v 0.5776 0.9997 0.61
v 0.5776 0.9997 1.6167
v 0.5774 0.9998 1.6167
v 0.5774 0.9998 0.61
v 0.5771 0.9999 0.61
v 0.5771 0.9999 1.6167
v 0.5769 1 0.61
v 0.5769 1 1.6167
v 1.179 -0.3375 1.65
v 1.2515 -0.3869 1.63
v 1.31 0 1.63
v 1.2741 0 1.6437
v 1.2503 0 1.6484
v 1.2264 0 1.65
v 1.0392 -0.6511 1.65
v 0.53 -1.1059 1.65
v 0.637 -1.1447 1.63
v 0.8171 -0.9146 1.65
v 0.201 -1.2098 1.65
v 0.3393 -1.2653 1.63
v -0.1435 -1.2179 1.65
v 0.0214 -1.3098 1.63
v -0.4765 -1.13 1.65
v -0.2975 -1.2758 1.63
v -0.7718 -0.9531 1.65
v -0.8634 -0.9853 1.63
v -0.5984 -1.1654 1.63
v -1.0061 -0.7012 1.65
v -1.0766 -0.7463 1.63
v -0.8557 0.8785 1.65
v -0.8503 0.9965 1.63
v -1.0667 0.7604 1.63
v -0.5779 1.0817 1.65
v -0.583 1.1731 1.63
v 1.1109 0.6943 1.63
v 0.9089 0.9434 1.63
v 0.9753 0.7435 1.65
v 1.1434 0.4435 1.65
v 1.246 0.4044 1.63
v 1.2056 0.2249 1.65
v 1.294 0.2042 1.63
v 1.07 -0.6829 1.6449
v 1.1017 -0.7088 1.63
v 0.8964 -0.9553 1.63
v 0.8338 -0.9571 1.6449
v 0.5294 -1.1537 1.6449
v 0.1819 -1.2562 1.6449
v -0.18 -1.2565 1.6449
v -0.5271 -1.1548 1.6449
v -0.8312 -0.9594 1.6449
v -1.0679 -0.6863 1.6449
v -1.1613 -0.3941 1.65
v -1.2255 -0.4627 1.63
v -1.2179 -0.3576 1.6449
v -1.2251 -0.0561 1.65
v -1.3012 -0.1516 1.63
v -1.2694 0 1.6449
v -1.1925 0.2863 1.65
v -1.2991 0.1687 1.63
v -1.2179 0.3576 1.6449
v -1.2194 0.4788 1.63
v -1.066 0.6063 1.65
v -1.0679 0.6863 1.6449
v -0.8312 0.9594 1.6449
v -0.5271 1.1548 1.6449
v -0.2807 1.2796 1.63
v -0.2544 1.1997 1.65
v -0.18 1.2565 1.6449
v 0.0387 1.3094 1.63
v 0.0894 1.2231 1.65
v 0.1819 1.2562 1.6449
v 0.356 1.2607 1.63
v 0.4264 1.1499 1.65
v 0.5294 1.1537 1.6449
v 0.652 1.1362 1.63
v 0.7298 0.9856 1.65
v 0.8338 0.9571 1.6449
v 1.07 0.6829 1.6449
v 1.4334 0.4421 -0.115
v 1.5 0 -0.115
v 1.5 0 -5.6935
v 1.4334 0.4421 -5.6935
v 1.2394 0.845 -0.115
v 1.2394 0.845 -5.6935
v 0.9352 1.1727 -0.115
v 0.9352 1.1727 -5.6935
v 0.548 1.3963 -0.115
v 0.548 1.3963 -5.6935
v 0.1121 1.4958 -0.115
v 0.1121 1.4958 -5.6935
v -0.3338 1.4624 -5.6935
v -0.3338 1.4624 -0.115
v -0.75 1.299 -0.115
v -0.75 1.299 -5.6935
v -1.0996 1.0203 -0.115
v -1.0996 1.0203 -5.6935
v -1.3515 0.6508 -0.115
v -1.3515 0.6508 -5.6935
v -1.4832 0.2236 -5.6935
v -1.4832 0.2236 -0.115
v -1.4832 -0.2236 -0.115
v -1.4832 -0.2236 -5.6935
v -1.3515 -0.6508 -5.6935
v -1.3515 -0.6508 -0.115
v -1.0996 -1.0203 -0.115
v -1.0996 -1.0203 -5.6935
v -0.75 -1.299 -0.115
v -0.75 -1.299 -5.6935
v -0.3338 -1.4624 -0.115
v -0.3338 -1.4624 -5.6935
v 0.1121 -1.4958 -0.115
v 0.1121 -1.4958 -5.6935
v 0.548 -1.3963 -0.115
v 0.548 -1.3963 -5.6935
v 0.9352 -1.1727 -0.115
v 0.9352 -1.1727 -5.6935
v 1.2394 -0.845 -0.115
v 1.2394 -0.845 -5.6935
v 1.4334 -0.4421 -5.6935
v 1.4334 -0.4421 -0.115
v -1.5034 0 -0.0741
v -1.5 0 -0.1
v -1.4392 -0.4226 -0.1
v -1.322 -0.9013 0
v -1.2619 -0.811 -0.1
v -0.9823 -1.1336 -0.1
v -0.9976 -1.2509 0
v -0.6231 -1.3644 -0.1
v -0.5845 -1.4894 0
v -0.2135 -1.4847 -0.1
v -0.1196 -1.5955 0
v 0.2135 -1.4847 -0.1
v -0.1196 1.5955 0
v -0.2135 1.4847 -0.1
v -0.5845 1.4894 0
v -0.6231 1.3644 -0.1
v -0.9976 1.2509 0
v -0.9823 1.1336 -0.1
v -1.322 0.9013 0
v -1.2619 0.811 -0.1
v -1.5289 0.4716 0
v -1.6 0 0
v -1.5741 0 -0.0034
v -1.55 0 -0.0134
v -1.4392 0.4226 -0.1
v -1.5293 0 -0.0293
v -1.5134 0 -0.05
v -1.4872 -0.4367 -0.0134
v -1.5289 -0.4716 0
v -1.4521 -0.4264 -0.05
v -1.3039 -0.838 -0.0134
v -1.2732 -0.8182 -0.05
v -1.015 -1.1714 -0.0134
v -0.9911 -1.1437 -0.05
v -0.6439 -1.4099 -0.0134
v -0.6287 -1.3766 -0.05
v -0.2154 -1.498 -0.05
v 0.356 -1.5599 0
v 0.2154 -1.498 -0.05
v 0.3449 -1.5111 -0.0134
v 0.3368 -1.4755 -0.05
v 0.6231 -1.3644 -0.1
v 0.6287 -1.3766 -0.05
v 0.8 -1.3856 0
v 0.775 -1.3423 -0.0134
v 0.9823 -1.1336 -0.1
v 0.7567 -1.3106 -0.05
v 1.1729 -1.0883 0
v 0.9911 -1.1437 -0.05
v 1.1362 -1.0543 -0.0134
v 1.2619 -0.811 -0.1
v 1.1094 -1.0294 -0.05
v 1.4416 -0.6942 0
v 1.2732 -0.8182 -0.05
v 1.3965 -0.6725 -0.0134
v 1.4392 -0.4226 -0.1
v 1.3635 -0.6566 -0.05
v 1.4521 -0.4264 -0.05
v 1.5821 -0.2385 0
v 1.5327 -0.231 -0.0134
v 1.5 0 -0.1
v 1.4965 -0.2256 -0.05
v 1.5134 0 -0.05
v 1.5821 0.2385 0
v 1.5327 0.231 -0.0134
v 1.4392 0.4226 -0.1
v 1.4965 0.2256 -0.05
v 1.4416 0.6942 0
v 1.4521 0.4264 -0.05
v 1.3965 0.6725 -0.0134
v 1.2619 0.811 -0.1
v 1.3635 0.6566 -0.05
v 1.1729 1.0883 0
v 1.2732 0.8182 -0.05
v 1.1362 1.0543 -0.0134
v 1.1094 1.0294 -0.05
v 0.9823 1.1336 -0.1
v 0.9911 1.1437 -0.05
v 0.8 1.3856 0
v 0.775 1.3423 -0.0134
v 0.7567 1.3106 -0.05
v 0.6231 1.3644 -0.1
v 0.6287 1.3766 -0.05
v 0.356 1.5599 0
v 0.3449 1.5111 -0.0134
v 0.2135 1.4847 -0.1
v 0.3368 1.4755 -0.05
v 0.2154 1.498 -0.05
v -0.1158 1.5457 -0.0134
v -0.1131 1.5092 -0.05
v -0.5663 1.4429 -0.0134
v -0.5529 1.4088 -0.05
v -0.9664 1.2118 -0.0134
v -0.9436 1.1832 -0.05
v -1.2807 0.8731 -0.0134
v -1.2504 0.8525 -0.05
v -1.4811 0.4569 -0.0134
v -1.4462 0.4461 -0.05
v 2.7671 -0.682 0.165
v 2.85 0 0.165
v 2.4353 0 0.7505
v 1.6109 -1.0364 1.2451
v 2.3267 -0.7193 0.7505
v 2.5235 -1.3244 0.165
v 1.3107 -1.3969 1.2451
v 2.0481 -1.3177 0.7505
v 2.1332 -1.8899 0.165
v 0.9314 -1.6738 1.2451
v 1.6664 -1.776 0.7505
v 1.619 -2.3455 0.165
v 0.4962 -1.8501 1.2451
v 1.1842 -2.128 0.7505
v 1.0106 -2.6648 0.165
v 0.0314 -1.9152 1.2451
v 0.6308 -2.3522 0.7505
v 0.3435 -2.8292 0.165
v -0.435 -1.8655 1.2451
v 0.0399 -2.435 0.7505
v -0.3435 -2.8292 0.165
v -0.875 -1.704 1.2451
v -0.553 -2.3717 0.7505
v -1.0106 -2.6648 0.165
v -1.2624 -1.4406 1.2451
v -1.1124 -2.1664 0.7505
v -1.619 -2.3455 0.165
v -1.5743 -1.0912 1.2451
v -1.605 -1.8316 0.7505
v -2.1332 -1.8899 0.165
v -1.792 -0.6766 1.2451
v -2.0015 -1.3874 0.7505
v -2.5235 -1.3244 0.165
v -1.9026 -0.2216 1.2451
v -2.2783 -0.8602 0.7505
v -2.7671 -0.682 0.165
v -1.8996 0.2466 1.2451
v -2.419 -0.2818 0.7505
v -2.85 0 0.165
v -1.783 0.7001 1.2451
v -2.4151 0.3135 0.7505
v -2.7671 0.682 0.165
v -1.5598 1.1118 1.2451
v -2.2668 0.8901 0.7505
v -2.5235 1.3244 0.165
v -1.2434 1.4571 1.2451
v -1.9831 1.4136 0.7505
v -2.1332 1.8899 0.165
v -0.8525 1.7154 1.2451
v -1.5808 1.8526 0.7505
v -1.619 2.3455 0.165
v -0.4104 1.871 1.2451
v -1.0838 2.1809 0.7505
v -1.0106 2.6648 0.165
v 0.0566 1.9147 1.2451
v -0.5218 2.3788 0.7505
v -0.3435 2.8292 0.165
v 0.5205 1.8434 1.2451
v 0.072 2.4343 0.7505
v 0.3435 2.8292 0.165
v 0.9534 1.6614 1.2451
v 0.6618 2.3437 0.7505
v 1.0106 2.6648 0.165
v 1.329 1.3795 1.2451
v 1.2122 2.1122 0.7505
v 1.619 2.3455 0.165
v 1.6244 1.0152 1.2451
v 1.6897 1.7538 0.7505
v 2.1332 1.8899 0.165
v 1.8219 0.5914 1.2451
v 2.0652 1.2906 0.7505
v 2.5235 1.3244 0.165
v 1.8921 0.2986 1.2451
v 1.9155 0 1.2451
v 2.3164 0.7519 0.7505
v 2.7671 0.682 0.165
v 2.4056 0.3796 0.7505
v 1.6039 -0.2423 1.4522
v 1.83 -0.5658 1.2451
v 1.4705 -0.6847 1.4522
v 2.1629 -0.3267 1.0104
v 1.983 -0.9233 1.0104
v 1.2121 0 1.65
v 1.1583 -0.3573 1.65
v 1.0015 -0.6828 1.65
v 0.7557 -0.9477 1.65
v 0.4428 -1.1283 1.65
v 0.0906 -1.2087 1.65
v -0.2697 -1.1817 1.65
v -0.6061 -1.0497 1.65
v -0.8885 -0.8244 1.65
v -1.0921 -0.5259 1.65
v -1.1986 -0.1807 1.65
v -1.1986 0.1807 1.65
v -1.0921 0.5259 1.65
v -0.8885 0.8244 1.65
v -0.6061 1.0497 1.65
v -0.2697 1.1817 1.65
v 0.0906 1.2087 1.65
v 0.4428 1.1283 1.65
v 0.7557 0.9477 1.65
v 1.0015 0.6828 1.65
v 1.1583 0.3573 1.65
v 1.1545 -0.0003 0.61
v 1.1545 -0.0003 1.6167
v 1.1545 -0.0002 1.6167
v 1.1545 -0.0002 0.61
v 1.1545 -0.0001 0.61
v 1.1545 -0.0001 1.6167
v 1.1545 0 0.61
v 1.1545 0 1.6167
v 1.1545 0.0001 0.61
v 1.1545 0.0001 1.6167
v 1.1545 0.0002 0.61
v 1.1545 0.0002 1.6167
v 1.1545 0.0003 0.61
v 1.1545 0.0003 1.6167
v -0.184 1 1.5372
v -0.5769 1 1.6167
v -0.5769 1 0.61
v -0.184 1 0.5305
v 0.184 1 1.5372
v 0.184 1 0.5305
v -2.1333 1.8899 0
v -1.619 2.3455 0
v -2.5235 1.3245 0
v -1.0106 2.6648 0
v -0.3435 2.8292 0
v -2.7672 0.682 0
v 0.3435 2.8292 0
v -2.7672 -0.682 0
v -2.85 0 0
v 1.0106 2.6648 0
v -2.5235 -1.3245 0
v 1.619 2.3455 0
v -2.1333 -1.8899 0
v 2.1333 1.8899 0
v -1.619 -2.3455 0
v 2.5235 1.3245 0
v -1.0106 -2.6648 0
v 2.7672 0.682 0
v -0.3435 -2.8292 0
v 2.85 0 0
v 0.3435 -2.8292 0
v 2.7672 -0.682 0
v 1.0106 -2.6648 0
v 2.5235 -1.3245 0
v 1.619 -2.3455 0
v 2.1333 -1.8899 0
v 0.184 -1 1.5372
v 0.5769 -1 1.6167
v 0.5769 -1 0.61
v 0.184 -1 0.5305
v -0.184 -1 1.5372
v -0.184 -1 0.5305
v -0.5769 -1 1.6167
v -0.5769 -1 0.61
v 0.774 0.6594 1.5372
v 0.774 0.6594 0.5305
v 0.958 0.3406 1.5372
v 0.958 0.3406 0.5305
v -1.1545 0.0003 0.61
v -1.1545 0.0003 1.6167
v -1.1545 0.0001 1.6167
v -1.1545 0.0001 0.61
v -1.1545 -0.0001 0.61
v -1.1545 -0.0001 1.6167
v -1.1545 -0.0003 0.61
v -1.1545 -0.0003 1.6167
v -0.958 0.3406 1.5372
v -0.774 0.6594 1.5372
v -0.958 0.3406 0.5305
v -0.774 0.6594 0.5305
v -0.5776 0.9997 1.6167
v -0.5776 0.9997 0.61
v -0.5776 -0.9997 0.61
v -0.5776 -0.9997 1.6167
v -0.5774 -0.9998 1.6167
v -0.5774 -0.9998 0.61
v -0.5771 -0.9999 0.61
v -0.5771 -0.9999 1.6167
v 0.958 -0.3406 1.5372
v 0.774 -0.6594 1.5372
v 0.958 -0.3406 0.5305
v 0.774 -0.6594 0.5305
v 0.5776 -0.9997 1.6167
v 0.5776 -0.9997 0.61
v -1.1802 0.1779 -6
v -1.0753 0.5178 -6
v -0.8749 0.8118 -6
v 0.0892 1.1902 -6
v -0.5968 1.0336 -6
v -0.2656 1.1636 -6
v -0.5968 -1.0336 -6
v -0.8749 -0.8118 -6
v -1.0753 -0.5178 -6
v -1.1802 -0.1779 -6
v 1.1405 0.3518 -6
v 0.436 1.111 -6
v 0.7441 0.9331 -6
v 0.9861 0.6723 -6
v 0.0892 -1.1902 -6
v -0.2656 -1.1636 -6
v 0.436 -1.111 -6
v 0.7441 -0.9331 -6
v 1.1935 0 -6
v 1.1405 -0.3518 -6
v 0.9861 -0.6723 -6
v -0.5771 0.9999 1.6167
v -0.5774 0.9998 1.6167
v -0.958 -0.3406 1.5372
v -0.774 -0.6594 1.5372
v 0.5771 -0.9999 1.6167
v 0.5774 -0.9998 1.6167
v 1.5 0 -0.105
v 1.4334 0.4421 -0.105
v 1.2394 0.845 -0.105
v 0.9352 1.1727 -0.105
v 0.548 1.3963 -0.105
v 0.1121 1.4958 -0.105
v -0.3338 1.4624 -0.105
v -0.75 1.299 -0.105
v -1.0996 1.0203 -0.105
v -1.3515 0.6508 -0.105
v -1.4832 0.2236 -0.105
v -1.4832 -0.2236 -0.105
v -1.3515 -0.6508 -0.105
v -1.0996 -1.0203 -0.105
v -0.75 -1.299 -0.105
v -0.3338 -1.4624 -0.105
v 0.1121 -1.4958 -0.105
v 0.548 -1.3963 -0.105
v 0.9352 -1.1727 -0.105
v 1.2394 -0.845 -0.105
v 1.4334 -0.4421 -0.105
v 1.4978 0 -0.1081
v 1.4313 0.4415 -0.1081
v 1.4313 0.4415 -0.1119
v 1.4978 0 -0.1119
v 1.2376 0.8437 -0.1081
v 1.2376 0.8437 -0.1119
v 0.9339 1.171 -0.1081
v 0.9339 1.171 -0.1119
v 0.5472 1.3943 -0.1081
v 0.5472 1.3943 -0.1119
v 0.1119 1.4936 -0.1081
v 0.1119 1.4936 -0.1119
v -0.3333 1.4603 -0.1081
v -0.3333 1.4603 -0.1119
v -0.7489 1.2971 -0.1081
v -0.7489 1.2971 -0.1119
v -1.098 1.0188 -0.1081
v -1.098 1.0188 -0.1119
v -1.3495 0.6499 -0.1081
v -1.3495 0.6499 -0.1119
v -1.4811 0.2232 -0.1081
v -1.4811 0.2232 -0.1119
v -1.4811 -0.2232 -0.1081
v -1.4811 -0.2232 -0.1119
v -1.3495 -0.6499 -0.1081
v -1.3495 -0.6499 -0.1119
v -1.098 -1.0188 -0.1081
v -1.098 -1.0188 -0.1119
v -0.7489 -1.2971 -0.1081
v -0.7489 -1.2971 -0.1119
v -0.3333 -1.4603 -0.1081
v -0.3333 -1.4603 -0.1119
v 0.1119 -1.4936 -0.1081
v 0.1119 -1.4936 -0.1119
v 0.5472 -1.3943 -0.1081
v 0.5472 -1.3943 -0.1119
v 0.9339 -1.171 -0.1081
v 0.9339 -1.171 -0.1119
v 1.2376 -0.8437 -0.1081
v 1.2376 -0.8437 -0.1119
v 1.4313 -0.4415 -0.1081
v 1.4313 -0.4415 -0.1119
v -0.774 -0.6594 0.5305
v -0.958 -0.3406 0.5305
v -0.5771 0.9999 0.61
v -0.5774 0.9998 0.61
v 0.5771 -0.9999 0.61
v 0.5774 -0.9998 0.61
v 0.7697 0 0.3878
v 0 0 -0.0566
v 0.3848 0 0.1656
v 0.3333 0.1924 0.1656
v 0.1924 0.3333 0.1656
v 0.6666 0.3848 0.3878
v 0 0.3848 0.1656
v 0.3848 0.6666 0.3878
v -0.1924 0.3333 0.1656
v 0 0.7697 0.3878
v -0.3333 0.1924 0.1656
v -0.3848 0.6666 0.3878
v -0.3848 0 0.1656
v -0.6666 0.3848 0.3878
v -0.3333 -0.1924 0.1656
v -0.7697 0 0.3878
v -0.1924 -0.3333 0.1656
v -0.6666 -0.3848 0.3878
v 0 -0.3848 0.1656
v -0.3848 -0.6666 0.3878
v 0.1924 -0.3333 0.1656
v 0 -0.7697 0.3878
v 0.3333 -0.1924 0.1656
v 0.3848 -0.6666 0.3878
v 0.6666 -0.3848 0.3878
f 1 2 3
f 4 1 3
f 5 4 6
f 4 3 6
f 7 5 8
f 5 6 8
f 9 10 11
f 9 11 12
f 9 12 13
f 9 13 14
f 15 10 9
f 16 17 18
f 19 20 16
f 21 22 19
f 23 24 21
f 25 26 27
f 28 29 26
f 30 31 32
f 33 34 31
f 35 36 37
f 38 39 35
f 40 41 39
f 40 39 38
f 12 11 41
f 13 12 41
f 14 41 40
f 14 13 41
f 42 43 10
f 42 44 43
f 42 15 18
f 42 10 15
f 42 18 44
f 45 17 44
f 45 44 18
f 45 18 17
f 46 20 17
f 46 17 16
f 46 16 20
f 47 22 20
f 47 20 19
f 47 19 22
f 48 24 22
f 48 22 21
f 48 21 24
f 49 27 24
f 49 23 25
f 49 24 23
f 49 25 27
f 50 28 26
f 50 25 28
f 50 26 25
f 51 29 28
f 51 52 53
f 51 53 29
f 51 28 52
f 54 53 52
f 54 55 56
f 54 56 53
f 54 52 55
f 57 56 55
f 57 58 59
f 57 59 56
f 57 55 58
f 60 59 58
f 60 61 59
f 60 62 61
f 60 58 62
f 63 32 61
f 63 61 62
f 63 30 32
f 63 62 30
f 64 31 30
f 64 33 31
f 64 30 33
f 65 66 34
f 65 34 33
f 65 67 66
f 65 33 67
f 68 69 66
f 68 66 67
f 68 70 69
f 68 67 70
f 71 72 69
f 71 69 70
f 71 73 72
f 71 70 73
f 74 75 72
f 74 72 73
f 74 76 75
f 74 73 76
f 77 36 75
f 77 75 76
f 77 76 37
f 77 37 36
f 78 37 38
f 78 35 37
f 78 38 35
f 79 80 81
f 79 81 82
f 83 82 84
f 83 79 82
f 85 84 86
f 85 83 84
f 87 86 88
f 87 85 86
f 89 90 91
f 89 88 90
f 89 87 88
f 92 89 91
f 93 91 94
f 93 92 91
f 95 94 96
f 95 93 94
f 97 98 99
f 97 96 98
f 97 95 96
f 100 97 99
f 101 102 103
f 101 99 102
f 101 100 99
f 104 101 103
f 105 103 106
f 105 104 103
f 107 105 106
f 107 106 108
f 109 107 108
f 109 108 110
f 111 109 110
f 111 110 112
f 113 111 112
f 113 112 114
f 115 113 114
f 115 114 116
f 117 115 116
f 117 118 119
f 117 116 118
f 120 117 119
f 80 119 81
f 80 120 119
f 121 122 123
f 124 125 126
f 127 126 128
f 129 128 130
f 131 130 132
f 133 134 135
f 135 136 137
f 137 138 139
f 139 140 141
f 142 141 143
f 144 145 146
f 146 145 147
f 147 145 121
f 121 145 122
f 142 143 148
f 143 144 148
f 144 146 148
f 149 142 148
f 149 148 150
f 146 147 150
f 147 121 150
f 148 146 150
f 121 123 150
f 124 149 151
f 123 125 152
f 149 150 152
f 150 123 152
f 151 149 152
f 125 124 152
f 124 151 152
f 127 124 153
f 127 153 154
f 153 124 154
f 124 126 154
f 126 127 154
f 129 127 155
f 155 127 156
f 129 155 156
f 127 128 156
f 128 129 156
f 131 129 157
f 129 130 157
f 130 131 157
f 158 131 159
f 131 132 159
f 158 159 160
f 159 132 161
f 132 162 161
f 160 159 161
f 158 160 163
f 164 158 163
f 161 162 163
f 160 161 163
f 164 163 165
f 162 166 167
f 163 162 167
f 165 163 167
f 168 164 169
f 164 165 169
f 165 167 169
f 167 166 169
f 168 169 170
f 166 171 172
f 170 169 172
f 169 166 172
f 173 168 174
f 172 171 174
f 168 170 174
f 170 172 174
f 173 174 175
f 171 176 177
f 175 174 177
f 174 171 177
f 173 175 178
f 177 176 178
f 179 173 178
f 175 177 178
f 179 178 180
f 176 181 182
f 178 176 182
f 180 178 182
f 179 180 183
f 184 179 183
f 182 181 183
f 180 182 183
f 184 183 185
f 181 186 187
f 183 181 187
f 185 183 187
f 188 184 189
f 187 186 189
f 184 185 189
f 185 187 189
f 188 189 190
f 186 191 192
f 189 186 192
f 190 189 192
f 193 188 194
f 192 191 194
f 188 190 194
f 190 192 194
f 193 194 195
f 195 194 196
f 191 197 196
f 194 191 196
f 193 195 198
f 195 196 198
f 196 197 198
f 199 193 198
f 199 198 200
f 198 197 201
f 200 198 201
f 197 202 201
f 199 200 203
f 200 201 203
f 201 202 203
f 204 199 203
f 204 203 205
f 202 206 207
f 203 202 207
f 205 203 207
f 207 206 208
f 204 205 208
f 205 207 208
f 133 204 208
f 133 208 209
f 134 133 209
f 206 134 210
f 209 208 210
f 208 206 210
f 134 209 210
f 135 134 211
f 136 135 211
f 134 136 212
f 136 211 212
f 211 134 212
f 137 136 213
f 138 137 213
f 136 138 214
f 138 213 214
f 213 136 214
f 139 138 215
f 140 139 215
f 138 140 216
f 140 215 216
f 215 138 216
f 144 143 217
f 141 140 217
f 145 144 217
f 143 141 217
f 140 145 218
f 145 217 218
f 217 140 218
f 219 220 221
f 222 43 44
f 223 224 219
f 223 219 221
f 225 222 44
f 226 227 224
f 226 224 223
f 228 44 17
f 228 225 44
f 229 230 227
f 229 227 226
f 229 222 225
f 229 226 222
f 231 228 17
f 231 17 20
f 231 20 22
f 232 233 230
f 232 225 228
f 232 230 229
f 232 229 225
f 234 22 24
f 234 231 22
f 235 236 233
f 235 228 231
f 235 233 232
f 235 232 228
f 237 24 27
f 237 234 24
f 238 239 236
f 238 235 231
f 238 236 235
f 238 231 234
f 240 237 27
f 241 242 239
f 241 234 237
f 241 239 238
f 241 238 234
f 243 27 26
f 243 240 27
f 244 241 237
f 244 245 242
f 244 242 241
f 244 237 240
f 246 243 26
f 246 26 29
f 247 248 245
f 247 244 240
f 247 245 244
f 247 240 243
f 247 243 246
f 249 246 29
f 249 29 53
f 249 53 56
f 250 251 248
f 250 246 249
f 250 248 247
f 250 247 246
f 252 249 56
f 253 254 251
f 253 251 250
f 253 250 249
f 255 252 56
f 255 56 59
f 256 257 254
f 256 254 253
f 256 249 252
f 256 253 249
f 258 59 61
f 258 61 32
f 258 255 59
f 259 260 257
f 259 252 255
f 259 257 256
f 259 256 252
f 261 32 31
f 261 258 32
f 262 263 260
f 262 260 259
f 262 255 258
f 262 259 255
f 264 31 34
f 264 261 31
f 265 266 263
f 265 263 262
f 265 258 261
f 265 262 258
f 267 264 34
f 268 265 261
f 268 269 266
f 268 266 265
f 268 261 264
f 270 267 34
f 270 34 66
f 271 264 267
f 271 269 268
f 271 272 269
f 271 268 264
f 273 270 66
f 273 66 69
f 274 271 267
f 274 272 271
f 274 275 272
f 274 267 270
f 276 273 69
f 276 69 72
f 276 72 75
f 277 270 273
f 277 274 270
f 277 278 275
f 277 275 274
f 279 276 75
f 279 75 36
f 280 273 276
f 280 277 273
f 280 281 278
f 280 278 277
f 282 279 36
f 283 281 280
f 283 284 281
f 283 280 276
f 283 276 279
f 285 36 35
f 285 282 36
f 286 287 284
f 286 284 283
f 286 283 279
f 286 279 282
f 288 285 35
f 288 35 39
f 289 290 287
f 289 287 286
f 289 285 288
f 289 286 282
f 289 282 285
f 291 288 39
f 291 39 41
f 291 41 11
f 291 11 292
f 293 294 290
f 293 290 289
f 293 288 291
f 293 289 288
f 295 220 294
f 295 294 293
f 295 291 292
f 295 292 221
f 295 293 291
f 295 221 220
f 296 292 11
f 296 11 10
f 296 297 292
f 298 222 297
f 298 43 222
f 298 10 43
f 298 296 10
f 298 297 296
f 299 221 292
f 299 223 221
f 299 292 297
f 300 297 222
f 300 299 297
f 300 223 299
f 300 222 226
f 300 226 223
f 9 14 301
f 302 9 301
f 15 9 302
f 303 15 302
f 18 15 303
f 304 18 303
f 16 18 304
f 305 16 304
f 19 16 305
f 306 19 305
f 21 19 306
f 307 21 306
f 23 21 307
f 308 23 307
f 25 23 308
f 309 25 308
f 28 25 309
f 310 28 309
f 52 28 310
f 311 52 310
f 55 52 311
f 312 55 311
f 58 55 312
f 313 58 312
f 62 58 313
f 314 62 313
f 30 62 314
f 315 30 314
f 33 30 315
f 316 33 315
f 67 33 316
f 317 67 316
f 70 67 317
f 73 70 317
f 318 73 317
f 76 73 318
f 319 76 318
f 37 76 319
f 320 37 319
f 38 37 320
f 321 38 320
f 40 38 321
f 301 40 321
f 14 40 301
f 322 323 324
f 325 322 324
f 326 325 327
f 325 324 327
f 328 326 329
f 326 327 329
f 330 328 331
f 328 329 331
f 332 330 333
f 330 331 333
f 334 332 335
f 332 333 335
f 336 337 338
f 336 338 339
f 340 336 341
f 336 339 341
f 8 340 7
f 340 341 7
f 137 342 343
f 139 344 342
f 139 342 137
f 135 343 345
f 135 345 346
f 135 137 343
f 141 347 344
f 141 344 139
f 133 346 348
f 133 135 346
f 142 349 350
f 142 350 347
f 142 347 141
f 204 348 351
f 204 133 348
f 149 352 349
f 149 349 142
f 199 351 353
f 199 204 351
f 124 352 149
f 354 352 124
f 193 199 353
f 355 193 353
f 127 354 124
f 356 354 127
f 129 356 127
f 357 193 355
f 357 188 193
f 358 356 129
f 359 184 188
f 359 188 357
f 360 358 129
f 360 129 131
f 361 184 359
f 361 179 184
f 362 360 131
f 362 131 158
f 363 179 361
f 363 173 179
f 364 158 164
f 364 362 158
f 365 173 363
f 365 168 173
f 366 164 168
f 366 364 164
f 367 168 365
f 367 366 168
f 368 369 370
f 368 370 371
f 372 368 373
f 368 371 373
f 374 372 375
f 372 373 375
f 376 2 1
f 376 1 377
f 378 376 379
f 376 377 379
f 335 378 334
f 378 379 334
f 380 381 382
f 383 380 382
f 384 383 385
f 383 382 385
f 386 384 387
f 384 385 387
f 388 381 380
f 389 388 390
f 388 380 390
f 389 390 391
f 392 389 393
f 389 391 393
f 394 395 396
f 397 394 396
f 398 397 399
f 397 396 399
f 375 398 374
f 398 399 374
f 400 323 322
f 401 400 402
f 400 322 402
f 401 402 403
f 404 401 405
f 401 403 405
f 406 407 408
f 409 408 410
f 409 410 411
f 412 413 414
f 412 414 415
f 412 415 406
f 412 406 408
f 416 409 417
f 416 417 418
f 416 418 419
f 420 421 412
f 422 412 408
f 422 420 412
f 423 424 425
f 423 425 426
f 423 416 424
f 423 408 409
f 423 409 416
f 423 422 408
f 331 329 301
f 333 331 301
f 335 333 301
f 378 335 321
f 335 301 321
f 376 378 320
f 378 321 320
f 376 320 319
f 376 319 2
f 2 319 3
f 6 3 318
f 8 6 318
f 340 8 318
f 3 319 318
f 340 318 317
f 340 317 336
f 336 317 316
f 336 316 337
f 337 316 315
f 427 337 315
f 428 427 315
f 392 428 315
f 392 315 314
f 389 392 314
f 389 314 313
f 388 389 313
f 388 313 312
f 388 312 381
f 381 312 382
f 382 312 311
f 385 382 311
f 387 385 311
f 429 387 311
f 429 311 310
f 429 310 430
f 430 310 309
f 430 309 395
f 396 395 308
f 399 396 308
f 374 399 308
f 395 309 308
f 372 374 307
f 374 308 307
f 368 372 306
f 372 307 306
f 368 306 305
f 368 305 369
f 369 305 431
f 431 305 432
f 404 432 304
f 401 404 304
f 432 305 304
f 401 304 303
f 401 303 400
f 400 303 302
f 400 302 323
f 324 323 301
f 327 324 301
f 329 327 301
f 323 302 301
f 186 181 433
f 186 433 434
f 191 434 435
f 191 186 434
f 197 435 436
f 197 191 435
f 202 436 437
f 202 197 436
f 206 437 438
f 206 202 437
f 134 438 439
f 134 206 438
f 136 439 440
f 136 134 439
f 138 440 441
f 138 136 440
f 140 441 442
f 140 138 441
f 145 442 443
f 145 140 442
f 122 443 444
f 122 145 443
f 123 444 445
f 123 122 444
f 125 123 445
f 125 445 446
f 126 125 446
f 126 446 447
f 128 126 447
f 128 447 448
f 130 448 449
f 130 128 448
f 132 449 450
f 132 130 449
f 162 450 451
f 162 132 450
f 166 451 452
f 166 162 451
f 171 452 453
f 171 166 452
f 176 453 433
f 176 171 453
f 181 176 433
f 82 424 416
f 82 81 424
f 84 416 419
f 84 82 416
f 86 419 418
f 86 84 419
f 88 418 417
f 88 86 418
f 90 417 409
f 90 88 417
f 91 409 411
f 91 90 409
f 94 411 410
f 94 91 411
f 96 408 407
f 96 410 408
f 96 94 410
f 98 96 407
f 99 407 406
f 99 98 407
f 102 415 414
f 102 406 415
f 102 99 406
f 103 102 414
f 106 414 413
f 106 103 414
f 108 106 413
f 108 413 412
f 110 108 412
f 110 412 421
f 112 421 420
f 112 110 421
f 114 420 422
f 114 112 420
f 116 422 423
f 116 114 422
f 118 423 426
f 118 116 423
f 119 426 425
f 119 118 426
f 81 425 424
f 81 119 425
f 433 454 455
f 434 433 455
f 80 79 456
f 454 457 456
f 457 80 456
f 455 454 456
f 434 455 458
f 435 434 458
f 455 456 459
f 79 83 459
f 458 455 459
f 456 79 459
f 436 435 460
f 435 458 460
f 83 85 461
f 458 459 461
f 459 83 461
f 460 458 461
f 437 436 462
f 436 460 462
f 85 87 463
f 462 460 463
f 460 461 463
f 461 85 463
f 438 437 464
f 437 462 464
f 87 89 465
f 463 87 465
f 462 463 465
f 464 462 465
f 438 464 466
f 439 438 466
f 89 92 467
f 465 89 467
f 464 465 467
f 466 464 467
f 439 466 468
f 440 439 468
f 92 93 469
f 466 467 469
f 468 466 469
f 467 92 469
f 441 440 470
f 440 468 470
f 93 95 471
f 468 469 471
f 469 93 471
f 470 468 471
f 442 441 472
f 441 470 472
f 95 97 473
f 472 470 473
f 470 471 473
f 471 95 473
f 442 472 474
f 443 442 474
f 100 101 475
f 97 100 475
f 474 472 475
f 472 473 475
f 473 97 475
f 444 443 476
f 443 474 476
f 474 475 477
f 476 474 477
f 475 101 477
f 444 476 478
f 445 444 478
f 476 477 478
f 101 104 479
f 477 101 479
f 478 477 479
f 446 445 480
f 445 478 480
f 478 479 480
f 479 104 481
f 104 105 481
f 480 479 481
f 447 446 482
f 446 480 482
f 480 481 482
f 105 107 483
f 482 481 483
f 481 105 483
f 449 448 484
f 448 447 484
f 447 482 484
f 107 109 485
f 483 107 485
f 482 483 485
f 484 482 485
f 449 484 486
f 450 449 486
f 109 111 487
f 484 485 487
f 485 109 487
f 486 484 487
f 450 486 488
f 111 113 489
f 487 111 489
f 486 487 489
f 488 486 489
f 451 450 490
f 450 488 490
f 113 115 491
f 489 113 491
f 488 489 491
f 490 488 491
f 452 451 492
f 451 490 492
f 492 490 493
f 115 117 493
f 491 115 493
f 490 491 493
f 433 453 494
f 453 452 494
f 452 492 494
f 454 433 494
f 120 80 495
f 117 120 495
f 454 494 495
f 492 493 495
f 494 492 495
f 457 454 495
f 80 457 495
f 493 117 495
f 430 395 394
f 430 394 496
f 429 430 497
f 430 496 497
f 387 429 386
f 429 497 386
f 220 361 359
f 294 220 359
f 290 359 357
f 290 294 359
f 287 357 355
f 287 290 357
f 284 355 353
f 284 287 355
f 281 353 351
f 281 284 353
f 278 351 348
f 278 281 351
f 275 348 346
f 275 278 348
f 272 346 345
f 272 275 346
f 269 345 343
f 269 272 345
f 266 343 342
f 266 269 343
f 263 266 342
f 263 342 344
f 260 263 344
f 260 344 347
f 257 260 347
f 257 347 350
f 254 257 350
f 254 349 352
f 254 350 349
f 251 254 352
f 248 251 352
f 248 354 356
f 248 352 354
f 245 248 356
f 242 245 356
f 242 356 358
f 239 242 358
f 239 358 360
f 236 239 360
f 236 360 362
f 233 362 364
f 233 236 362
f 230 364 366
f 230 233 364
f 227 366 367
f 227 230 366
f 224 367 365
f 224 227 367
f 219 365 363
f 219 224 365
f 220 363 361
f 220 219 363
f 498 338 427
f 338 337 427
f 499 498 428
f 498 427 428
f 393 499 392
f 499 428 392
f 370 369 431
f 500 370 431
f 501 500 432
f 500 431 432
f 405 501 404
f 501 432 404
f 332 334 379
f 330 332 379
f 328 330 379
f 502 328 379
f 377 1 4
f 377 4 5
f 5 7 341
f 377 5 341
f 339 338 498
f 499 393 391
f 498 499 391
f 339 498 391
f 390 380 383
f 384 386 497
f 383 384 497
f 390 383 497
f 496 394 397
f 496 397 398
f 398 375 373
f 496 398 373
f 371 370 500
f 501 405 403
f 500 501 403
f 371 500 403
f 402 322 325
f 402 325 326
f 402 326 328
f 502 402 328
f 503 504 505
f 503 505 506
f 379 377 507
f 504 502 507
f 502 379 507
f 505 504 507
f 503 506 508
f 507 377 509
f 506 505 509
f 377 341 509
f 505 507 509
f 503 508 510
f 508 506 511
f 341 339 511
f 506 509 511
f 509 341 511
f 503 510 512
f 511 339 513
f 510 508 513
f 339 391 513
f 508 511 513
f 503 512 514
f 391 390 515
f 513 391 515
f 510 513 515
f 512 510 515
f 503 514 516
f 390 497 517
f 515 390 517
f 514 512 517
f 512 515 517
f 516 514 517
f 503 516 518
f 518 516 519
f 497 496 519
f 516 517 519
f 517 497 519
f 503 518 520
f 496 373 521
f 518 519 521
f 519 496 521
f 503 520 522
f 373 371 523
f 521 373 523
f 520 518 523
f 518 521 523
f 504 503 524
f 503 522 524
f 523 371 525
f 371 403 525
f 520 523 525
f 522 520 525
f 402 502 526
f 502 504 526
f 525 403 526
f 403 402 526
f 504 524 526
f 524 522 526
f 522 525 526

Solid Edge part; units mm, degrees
sketch "Sketch1" plane through (0, 0, 0) normal (0, -1, 0) x (1, 0, 0)
  line L0 (0, -6) -> (1.5, -6)
  line L1 (1.5, -6) -> (1.5, -0.115)
  arc A0 (1.5, -0.105) -> (1.5, -0.115) centre (1.5038, -0.11) ccw
  line L2 (1.5, -0.105) -> (1.5, 0)
  line L3 (1.5, 0) -> (2.85, 0)
  line L4 (2.85, 0) -> (2.85, 0.165)
  arc A1 (1.27, 1.65) -> (2.85, 0.165) centre (-0.3628, -1.6703) cw
  line L5 (0, 1.65) -> (1.27, 1.65)
  dimension "D1" = 5.885
  dimension "D2" = 1.5
  dimension "D3" = 1.27
  dimension "D4" = 2.85
  dimension "D5" = 0.165
  dimension "D6" = 1.65
  dimension "D7" = 3.7
  dimension "D8" = 6
  dimension "D9" = 0.01
  dimension "D10" = 0.0025
revolve "RevolvedProtrusion1" add sketch "Sketch1" angle 360 about axis through (0, 0, 5) along (0, 0, -1)
sketch "Sketch2" plane through (0, 0, 0) normal (0, -1, 0) x (1, 0, 0)
  line L0 (0, -0.0566) -> (1.1545, 0.61)
  line L1 (1.1545, 0.61) -> (1.1545, 1.65)
  line L2 (1.1545, 1.65) -> (0, 1.65)
  dimension "D1" = 1.1545
  dimension "D2" = 1.04
revolve "RevolvedCutout1" cut sketch "Sketch2" angle 360 about axis through (0, 0, 5.3) along (0, 0, -1)
sketch "Sketch3" plane through (0, 0, 0) normal (0, 0, -1) x (0, 1, 0)
  arc A0 (-1, 0.577) -> (-1, -0.577) centre (0, 0) ccw
  line L0 (-1, 0.577) -> (-1, -0.577)
  dimension "D1" = 1
extrude "Protrusion1" add sketch "Sketch3" against normal blind 1.65
pattern_circular "Pattern1" count 6 over 360 about axis through (0, 0, 0) along (0, 0, -1) of "Protrusion1"
fillet "Round_1" radius 0.185 1 edges at (-1.27, 0, 1.65)
sketch "Sketch4" plane through (0, 0, 0) normal (0, -1, 0) x (1, 0, 0)
  line L0 (0, 0.9501) -> (1.2122, 1.65)
  line L1 (1.2122, 1.65) -> (0, 1.65)
  dimension "D1" = 1.2122
revolve "RevolvedCutout2" cut sketch "Sketch4" angle 360 about axis through (0, 0, 5.3) along (0, 0, -1)
sketch "Sketch5" plane through (0, 0, 0) normal (0, -1, 0) x (1, 0, 0)
  line L0 (-1.5, 0) -> (-1.5, -0.1)
  line L1 (-1.6, 0) -> (-1.5, 0)
  arc A0 (-1.6, 0) -> (-1.5, -0.1) centre (-1.6, -0.1) cw
  dimension "D1" = 1.5
  dimension "D2" = 0.1
revolve "RevolvedProtrusion2" add sketch "Sketch5" angle 360 about axis through (0, 0, -0.5) along (0, 0, 1)
cosmetic_thread "Thread1" size "M3"
chamfer "Chamfer1" distance 0.3065 angle 45 1 edges at (-1.5, 0, -6)
properties material "Stahl"
